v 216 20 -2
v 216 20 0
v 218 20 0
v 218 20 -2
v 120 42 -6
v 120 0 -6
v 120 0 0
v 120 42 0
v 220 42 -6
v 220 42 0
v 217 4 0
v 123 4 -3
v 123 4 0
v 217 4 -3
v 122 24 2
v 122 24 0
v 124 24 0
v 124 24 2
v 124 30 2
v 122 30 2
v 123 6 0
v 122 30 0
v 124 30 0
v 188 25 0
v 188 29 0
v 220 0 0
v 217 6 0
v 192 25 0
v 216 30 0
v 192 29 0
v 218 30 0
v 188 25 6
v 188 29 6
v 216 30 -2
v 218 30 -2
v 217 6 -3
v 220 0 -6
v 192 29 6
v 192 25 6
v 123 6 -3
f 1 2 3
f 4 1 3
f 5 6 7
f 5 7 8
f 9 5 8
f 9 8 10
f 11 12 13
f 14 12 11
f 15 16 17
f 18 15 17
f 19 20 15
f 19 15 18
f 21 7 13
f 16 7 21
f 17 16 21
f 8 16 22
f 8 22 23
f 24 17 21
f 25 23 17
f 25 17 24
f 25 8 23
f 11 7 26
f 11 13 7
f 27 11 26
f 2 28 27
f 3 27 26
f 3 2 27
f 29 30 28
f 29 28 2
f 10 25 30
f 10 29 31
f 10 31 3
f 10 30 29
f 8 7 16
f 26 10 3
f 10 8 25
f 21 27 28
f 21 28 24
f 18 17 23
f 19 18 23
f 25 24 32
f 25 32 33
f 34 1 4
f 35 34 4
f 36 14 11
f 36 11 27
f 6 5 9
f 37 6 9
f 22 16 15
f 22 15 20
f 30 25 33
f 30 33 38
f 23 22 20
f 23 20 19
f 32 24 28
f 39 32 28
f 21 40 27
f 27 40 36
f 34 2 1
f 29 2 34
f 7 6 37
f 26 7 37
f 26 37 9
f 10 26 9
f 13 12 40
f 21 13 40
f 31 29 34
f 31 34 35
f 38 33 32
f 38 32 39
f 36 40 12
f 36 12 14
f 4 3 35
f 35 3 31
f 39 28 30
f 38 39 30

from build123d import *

# Parameters (mm, degrees)
BOX003_W        = 94
BOX003_H        = 2
BOX003_DEPTH    = 3
BOX002_W        = 100
BOX002_H        = 42
BOX002_DEPTH    = 6
SKETCH013_W     = 2
SKETCH013_H     = 10
POCKET006_DEPTH = 2
SKETCH015_W     = 2
SKETCH015_H     = 6
PAD007_DEPTH    = 2
SKETCH021_W     = 4
SKETCH021_H     = 4
PAD011_DEPTH    = 6


with BuildPart() as cube003:
    # Box003 → Box003 (new body)
    with BuildSketch(Plane(origin=(123, 4, -3), x_dir=(1, 0, 0), z_dir=(0, 0, 1))):
        with Locations((47, 1)):
            Rectangle(BOX003_W, BOX003_H)
    extrude(amount=BOX003_DEPTH)


with BuildPart() as roof_body:
    # Box002 → Box002 (new body)
    with BuildSketch(Plane(origin=(120, 0, -6), x_dir=(1, 0, 0), z_dir=(0, 0, 1))):
        with Locations((50, 21)):
            Rectangle(BOX002_W, BOX002_H)
    extrude(amount=BOX002_DEPTH)

    # Cut001: cut Cube003
    add(cube003.part, mode=Mode.SUBTRACT)

    # Sketch013 (on Face3 of BaseFeature) → Pocket006 (cut)
    with BuildSketch(Plane.XY):
        with Locations((217, 25)):
            Rectangle(SKETCH013_W, SKETCH013_H)
    extrude(amount=-POCKET006_DEPTH, mode=Mode.SUBTRACT)

    # Sketch015 (on Face3 of Pocket006) → Pad007 (join)
    with BuildSketch(Plane.XY):
        with Locations((123, 27)):
            Rectangle(SKETCH015_W, SKETCH015_H)
    extrude(amount=PAD007_DEPTH)

    # Sketch021 (on Face3 of Pad007) → Pad011 (join)
    with BuildSketch(Plane.XY):
        with Locations((190, 27)):
            Rectangle(SKETCH021_W, SKETCH021_H)
    extrude(amount=PAD011_DEPTH)


solid = roof_body.part
